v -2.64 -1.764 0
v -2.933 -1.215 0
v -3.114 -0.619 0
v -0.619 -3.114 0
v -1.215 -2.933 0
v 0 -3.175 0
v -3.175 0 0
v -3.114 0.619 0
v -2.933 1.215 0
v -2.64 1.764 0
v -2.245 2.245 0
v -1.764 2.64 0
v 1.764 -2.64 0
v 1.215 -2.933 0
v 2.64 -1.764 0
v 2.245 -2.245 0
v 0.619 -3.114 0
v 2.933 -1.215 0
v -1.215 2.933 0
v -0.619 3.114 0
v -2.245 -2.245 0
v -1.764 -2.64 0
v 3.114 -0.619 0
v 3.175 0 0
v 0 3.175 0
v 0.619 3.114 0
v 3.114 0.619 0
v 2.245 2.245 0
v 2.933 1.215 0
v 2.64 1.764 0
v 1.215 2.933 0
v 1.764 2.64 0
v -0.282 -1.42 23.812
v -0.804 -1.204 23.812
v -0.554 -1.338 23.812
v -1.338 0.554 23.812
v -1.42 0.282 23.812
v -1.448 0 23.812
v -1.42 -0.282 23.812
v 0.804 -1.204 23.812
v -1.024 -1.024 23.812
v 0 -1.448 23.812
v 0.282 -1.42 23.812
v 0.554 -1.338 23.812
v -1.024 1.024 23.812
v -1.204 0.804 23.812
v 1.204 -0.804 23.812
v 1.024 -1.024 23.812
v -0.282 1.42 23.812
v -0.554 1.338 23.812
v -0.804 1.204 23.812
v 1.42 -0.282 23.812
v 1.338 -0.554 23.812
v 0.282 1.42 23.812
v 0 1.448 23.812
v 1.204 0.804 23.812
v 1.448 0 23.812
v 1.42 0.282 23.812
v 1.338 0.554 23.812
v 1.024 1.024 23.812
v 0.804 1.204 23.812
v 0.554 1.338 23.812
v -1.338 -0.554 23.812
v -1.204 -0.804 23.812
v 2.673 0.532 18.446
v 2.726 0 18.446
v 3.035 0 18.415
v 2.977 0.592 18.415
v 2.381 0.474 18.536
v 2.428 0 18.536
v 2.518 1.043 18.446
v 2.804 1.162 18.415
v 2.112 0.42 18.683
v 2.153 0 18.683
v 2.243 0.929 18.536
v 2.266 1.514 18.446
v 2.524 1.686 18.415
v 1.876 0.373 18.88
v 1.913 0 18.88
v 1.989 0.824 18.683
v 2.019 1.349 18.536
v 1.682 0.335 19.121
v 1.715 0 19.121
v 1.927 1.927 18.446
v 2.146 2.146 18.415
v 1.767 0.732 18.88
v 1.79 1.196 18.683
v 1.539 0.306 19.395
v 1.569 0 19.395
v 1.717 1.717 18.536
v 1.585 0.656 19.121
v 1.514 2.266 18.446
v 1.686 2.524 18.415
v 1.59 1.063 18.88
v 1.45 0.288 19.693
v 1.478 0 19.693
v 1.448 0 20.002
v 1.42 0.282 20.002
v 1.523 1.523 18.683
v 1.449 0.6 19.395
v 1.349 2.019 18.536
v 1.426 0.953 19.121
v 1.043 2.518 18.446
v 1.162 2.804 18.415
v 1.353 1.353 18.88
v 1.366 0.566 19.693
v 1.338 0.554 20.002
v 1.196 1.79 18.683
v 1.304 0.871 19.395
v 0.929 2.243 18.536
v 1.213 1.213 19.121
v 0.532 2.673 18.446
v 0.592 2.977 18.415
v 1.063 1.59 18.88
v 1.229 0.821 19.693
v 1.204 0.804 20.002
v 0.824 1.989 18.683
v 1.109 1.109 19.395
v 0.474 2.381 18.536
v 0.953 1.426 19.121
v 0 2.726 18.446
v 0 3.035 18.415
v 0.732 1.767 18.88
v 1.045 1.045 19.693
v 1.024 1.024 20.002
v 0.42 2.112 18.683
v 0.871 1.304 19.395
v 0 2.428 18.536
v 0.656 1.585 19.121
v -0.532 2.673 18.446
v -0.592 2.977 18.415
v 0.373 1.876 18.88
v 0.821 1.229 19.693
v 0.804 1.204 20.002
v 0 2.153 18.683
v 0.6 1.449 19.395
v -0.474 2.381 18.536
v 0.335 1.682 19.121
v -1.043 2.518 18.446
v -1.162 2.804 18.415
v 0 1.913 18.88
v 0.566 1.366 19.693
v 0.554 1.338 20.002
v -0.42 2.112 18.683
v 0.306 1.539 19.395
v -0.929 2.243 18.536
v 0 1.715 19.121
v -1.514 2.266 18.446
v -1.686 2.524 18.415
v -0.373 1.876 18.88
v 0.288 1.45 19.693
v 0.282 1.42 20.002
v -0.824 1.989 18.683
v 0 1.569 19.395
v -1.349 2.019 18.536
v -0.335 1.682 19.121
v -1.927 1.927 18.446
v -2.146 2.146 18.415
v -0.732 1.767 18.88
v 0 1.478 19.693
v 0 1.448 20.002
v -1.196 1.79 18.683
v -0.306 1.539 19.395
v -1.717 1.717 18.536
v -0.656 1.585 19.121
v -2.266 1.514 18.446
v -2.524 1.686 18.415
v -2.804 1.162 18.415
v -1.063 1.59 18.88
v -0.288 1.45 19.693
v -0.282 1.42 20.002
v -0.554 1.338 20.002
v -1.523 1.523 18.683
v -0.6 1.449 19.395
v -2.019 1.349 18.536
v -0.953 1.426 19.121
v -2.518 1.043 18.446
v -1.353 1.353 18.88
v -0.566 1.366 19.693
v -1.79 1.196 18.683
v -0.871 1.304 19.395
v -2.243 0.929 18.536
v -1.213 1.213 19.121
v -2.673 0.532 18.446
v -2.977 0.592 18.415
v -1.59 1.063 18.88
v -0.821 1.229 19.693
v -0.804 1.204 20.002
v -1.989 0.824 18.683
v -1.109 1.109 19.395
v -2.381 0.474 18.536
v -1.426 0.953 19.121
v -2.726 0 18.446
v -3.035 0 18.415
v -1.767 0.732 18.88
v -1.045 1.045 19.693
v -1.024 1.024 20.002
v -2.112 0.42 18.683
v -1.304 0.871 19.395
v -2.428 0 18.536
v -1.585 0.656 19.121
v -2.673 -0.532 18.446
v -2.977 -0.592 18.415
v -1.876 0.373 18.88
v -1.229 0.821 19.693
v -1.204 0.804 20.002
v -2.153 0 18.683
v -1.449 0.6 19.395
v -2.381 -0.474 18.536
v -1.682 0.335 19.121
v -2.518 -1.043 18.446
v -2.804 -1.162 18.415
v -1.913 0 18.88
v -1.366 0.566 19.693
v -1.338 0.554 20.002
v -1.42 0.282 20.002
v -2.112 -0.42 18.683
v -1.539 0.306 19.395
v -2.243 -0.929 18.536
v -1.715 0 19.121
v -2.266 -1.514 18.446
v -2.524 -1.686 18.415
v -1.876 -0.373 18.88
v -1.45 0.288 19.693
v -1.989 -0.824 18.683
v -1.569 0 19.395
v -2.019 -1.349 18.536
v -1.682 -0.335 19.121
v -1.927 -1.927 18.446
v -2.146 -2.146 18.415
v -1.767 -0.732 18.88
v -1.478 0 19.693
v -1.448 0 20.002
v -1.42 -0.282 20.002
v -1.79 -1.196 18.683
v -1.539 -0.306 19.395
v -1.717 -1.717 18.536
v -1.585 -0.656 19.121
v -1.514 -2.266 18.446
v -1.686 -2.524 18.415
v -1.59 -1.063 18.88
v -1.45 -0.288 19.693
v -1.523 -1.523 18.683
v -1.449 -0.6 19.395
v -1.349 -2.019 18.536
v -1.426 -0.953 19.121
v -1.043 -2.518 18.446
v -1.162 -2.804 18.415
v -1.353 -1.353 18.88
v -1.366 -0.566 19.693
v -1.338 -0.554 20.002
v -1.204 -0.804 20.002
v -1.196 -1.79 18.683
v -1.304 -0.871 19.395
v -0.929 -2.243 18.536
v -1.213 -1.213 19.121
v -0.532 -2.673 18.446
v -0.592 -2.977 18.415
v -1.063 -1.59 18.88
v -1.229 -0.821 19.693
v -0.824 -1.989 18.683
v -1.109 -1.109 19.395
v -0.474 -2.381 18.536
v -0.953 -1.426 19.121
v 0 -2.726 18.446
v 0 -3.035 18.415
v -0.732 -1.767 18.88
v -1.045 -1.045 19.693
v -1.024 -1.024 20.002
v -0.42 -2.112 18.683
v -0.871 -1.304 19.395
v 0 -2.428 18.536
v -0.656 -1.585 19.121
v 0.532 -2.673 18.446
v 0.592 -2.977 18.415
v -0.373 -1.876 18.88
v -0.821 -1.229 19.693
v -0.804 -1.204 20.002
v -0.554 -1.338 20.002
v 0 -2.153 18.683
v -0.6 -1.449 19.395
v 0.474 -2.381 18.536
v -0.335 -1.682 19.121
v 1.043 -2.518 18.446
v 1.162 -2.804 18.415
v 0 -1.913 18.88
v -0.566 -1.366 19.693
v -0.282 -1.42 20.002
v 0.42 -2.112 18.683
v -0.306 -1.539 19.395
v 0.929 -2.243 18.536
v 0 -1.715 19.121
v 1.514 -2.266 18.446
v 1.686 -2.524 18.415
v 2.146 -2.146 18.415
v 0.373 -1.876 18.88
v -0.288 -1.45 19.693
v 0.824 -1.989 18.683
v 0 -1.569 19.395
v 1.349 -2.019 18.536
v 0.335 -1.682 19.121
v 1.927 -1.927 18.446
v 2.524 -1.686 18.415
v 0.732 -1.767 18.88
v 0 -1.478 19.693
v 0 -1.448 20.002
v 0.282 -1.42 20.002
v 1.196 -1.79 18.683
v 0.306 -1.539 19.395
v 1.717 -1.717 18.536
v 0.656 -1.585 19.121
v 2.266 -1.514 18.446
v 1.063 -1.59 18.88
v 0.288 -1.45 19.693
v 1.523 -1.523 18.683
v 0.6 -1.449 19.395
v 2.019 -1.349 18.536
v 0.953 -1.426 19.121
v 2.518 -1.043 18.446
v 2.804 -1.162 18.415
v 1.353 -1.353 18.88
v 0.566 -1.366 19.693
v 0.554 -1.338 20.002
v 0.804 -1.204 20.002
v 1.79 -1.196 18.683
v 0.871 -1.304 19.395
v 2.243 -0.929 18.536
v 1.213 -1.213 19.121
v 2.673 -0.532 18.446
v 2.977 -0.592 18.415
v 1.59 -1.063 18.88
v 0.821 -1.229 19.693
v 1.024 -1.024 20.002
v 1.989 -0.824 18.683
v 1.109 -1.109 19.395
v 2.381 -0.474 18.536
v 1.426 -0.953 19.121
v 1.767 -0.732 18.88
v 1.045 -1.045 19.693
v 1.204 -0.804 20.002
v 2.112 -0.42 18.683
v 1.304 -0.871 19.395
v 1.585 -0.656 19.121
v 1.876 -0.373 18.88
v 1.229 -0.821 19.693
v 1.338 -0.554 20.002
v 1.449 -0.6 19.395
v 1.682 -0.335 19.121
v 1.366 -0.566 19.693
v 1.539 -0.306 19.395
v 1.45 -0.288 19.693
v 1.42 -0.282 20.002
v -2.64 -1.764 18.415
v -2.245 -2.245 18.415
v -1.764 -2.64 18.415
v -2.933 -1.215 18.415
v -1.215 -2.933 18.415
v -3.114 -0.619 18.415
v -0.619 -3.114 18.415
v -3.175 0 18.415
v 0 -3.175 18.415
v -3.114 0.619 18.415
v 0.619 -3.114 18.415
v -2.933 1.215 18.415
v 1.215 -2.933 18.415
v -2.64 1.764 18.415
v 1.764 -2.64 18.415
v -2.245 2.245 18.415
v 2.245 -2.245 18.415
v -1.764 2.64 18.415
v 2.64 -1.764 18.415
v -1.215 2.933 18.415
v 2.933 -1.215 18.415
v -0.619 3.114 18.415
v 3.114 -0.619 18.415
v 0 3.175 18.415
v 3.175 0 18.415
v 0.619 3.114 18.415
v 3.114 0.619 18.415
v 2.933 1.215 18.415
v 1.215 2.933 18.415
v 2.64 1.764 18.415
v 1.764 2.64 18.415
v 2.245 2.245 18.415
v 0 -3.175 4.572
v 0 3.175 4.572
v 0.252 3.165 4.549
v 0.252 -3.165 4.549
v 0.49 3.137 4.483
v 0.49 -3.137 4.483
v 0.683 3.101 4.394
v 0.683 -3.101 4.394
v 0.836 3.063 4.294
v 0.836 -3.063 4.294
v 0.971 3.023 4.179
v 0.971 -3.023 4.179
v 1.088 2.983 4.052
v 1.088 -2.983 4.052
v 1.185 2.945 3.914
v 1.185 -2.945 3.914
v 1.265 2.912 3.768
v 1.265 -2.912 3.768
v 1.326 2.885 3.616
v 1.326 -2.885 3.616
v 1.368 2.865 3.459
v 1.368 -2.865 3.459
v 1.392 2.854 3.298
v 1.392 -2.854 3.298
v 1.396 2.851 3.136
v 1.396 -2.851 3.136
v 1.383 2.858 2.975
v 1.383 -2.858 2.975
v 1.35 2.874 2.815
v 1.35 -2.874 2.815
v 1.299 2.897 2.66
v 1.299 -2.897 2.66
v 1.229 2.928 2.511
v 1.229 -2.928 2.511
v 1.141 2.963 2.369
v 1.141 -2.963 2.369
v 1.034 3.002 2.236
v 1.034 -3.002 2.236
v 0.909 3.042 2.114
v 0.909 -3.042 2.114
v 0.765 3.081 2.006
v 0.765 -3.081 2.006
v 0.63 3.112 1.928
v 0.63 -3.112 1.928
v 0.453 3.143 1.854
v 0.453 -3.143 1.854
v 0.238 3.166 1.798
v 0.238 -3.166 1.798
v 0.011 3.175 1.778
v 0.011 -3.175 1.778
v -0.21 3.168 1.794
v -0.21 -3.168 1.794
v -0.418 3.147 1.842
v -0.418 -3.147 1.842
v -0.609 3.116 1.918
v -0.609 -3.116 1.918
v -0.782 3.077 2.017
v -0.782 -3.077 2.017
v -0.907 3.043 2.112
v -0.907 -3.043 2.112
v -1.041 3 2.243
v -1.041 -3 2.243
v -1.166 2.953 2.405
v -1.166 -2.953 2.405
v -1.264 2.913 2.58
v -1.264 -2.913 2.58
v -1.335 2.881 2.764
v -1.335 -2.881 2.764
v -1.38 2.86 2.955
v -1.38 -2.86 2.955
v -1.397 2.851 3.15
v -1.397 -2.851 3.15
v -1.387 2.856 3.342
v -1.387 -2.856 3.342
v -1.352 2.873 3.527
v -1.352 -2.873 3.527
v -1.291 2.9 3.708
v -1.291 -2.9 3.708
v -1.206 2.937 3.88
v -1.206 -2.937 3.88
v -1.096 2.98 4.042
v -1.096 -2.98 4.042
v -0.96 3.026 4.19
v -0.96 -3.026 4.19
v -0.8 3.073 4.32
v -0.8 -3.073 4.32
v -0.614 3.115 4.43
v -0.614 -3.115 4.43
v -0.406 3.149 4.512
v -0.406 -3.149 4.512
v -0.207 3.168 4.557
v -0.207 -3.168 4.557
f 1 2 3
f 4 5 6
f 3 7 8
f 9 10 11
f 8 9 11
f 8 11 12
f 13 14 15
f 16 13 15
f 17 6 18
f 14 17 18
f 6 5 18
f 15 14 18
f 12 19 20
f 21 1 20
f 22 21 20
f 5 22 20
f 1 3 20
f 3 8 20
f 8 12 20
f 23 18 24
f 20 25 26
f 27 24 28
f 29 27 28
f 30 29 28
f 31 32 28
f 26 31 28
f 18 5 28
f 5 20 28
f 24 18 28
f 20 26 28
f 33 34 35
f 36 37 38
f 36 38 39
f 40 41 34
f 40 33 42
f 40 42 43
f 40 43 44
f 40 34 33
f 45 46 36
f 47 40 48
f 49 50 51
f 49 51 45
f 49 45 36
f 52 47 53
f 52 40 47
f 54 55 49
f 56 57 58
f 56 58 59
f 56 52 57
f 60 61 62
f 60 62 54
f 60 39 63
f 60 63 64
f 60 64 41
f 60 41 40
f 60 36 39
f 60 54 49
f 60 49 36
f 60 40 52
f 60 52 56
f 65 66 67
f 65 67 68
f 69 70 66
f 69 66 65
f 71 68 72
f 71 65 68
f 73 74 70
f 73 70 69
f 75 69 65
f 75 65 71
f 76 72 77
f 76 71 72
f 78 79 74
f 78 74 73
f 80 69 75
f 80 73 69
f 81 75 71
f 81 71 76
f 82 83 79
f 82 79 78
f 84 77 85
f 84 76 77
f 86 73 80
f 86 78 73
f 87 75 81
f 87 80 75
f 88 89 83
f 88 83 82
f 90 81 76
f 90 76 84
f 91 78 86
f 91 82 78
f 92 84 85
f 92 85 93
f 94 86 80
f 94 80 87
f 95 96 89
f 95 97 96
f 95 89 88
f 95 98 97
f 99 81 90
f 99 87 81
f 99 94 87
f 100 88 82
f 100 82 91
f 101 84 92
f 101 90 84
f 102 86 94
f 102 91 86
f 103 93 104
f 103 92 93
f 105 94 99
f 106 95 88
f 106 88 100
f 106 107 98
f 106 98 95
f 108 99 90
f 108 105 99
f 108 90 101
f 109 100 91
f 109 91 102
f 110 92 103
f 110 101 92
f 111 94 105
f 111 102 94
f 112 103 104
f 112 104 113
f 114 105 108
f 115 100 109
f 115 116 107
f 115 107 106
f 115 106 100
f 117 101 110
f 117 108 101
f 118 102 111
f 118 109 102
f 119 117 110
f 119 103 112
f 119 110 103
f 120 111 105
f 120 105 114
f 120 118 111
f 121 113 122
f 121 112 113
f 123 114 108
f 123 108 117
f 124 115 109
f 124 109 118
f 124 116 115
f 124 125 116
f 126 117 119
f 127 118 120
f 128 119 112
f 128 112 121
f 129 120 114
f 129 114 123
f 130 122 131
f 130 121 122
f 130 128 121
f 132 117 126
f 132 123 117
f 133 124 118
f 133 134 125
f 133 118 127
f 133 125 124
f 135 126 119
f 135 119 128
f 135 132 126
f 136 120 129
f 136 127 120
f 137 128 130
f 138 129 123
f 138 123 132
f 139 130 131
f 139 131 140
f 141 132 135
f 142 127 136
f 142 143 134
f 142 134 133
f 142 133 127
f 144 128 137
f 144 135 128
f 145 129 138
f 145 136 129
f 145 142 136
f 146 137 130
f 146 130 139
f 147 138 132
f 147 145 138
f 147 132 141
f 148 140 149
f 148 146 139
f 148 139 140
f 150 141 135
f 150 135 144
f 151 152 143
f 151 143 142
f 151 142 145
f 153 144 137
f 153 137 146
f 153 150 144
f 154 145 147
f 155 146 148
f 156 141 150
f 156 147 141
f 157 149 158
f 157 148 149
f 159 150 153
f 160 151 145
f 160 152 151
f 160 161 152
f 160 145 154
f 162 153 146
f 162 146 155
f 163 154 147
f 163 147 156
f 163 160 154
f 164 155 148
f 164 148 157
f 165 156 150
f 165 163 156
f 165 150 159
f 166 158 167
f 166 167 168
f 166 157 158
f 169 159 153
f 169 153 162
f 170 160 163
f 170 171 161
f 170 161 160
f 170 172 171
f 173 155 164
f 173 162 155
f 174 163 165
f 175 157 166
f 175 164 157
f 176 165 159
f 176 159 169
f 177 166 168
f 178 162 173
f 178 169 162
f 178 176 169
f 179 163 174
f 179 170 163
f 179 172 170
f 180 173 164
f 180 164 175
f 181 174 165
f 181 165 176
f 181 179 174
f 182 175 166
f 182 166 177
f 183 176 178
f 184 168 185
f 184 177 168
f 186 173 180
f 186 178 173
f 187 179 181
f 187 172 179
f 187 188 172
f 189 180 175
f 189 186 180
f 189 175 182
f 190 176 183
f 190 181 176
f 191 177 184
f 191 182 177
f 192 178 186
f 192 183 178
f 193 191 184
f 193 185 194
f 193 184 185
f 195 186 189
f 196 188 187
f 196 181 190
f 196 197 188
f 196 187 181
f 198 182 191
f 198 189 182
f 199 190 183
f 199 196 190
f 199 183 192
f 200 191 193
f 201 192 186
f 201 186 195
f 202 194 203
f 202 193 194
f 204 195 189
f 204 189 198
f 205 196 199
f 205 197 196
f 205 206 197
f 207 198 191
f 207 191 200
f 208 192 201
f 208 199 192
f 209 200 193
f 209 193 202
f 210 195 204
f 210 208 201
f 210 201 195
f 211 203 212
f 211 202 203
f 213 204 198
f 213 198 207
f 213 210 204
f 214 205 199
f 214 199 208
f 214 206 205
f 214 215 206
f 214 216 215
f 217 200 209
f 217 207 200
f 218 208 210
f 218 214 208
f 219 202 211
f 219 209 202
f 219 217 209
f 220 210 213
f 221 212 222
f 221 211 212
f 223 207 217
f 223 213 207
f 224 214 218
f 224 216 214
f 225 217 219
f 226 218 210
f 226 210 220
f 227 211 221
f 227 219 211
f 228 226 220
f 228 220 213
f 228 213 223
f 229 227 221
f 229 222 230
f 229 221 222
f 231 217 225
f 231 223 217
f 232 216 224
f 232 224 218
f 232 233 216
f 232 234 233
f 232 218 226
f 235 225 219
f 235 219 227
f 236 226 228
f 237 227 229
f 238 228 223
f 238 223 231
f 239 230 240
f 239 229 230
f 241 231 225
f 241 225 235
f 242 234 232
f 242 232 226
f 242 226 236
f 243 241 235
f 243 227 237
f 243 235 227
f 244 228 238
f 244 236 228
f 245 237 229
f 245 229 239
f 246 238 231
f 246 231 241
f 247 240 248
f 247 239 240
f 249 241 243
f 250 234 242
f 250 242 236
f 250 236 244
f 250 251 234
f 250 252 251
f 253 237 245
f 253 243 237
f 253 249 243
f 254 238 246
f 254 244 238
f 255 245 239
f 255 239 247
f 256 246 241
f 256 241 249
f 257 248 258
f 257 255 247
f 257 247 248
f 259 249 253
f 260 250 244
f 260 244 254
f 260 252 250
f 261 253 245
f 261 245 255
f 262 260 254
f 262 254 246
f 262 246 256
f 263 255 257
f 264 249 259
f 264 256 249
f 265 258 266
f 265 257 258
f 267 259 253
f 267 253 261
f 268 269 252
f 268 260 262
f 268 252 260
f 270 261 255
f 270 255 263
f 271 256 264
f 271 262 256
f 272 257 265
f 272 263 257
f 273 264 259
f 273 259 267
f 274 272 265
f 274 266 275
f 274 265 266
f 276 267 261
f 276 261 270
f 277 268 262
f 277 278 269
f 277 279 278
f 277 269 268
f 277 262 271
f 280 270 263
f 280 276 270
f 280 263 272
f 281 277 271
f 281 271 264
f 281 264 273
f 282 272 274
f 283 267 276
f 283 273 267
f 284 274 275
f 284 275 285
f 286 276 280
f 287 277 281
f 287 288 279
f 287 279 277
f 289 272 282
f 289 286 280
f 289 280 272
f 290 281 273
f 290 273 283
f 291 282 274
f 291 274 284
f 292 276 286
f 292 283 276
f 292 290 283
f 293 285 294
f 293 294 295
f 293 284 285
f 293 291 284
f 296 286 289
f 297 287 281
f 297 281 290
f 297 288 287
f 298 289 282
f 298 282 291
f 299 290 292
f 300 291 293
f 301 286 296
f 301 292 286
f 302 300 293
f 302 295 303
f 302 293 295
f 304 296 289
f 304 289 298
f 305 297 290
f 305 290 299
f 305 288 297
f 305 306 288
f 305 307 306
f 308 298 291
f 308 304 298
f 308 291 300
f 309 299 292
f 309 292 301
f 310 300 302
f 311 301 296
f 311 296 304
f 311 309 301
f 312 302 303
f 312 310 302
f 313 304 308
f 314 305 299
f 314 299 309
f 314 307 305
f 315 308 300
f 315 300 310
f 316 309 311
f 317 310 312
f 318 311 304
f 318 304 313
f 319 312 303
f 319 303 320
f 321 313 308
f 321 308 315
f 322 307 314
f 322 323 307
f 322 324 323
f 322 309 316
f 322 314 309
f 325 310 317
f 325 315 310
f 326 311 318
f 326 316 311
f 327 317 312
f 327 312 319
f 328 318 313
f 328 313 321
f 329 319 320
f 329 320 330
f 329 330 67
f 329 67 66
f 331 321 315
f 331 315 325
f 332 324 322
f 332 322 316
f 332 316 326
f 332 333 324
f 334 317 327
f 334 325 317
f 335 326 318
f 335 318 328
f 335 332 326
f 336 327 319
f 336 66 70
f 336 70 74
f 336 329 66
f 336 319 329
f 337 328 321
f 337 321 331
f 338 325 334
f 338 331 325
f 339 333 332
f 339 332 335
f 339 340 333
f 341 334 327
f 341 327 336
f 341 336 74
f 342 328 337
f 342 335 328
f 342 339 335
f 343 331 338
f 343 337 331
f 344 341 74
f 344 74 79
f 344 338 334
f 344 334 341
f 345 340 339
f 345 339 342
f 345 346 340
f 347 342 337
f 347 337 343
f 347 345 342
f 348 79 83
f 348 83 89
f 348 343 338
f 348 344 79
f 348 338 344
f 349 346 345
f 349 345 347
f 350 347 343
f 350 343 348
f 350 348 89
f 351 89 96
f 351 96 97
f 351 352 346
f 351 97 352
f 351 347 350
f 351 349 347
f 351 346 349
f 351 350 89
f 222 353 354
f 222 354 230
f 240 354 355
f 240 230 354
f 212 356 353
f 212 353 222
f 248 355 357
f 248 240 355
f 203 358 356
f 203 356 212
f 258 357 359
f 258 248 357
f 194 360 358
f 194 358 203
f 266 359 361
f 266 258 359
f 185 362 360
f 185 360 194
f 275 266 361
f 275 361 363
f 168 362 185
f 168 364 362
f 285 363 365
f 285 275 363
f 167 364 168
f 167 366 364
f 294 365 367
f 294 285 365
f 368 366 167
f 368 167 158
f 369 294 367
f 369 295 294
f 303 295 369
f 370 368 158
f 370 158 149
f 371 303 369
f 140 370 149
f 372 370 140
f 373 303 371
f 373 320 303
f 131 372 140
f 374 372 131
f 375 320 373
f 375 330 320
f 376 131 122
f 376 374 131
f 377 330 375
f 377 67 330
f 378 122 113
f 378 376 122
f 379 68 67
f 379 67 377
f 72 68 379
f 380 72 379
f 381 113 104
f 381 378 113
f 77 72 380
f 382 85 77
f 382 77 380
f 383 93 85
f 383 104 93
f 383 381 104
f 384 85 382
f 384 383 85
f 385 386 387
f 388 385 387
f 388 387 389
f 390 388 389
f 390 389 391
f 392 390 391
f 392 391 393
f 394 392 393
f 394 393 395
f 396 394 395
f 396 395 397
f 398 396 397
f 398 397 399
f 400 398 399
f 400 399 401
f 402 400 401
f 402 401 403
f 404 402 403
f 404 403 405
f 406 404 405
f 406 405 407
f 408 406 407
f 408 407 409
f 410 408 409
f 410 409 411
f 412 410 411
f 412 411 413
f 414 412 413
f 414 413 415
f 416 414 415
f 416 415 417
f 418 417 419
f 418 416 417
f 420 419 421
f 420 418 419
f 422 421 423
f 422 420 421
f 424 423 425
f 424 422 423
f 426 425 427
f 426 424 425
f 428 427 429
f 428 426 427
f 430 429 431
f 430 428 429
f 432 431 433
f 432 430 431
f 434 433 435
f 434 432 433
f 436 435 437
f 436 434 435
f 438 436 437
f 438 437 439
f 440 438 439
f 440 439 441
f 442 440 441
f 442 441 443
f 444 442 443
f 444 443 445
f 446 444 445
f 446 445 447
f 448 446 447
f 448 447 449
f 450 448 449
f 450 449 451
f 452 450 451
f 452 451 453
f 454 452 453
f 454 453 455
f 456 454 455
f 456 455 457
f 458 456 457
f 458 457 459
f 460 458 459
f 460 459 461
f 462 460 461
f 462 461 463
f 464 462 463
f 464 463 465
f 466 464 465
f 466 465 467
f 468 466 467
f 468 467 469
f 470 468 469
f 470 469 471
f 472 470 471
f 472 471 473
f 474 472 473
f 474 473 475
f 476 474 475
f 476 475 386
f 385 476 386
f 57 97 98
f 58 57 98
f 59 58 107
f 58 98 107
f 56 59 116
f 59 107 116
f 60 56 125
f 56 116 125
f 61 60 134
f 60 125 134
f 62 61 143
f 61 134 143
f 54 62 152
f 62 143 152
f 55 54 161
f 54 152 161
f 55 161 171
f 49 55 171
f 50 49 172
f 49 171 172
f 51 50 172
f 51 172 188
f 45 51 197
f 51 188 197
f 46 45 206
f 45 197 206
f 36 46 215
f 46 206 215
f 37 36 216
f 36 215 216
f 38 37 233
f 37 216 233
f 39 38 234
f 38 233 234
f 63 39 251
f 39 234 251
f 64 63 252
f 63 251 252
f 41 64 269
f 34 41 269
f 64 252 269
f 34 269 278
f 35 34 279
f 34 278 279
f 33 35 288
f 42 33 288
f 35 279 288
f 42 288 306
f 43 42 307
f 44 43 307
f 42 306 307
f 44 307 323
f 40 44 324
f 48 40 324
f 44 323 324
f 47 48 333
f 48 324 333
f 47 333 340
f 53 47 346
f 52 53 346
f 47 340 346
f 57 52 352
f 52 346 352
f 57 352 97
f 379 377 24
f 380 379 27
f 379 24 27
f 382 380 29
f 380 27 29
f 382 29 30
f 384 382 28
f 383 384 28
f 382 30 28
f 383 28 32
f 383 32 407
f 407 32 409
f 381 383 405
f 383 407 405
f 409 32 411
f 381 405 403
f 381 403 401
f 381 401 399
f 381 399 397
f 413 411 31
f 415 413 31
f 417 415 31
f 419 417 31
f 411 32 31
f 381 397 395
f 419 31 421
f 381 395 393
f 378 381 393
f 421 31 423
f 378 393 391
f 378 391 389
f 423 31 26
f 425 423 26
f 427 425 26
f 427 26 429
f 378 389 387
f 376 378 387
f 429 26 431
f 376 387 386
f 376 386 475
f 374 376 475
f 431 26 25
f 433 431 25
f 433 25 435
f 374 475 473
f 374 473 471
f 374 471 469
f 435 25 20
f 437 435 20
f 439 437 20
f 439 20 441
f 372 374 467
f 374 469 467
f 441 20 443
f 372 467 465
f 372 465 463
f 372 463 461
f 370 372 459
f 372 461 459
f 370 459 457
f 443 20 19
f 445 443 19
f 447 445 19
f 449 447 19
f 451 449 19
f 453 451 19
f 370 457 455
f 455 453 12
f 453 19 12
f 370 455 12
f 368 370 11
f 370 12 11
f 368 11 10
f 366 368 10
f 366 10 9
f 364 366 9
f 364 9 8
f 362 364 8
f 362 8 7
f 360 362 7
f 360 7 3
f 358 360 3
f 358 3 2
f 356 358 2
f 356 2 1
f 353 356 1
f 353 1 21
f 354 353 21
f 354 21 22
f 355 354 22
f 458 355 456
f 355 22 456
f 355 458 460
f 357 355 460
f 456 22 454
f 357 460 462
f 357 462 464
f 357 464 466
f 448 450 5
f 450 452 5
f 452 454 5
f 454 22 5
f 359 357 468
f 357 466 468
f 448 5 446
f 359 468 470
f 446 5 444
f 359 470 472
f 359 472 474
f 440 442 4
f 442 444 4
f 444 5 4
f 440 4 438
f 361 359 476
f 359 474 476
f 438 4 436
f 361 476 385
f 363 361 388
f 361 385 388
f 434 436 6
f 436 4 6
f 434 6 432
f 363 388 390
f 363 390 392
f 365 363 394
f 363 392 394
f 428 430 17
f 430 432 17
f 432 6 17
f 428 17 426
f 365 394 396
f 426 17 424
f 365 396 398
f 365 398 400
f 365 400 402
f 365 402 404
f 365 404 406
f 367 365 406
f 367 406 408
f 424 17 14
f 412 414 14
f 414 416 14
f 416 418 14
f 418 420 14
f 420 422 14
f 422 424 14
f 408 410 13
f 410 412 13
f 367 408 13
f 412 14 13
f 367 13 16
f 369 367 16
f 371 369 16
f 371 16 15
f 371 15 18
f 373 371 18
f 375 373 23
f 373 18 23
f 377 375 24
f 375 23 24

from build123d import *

# Parameters (mm, degrees)
SKETCH1_R               = 3.175
BOSS_EXTRUDE1_DEPTH     = 18.415
SKETCH2_R               = 1.4478
BOSS_EXTRUDE2_DEPTH     = 5.3975
FILLET1_R               = 1.5875
CUT_EXTRUDE1_DEPTH      = 25.232135817
CUT_EXTRUDE1_DEPTH_BACK = 25.232135817
SKETCH3_R               = 1.397


with BuildPart() as part:
    # Sketch1 → Boss-Extrude1 (new body)
    with BuildSketch(Plane.XY):
        Circle(SKETCH1_R)
    extrude(amount=BOSS_EXTRUDE1_DEPTH)

    # Sketch2 → Boss-Extrude2 (add)
    with BuildSketch(Plane.XY.offset(18.415)):
        Circle(SKETCH2_R)
    extrude(amount=BOSS_EXTRUDE2_DEPTH)

    # Fillet1
    fillet1_edges = [part.edges().sort_by_distance(p)[0] for p in [
        (-1.4478, 0, 18.415),
    ]]
    fillet(fillet1_edges, radius=FILLET1_R)

    # Sketch3 → Cut-Extrude1 (cut, two sides: drawn at the far end of the back side and taken through both)
    with BuildSketch(Plane(origin=(0, 0, 0), x_dir=(1, 0, 0), z_dir=(0, 1, 0)).offset(-CUT_EXTRUDE1_DEPTH_BACK)):
        with Locations(Location((0, -3.175, 0), (0, 0, 270))):
            Circle(SKETCH3_R)
    extrude(amount=CUT_EXTRUDE1_DEPTH + CUT_EXTRUDE1_DEPTH_BACK, mode=Mode.SUBTRACT)


solid = part.part
